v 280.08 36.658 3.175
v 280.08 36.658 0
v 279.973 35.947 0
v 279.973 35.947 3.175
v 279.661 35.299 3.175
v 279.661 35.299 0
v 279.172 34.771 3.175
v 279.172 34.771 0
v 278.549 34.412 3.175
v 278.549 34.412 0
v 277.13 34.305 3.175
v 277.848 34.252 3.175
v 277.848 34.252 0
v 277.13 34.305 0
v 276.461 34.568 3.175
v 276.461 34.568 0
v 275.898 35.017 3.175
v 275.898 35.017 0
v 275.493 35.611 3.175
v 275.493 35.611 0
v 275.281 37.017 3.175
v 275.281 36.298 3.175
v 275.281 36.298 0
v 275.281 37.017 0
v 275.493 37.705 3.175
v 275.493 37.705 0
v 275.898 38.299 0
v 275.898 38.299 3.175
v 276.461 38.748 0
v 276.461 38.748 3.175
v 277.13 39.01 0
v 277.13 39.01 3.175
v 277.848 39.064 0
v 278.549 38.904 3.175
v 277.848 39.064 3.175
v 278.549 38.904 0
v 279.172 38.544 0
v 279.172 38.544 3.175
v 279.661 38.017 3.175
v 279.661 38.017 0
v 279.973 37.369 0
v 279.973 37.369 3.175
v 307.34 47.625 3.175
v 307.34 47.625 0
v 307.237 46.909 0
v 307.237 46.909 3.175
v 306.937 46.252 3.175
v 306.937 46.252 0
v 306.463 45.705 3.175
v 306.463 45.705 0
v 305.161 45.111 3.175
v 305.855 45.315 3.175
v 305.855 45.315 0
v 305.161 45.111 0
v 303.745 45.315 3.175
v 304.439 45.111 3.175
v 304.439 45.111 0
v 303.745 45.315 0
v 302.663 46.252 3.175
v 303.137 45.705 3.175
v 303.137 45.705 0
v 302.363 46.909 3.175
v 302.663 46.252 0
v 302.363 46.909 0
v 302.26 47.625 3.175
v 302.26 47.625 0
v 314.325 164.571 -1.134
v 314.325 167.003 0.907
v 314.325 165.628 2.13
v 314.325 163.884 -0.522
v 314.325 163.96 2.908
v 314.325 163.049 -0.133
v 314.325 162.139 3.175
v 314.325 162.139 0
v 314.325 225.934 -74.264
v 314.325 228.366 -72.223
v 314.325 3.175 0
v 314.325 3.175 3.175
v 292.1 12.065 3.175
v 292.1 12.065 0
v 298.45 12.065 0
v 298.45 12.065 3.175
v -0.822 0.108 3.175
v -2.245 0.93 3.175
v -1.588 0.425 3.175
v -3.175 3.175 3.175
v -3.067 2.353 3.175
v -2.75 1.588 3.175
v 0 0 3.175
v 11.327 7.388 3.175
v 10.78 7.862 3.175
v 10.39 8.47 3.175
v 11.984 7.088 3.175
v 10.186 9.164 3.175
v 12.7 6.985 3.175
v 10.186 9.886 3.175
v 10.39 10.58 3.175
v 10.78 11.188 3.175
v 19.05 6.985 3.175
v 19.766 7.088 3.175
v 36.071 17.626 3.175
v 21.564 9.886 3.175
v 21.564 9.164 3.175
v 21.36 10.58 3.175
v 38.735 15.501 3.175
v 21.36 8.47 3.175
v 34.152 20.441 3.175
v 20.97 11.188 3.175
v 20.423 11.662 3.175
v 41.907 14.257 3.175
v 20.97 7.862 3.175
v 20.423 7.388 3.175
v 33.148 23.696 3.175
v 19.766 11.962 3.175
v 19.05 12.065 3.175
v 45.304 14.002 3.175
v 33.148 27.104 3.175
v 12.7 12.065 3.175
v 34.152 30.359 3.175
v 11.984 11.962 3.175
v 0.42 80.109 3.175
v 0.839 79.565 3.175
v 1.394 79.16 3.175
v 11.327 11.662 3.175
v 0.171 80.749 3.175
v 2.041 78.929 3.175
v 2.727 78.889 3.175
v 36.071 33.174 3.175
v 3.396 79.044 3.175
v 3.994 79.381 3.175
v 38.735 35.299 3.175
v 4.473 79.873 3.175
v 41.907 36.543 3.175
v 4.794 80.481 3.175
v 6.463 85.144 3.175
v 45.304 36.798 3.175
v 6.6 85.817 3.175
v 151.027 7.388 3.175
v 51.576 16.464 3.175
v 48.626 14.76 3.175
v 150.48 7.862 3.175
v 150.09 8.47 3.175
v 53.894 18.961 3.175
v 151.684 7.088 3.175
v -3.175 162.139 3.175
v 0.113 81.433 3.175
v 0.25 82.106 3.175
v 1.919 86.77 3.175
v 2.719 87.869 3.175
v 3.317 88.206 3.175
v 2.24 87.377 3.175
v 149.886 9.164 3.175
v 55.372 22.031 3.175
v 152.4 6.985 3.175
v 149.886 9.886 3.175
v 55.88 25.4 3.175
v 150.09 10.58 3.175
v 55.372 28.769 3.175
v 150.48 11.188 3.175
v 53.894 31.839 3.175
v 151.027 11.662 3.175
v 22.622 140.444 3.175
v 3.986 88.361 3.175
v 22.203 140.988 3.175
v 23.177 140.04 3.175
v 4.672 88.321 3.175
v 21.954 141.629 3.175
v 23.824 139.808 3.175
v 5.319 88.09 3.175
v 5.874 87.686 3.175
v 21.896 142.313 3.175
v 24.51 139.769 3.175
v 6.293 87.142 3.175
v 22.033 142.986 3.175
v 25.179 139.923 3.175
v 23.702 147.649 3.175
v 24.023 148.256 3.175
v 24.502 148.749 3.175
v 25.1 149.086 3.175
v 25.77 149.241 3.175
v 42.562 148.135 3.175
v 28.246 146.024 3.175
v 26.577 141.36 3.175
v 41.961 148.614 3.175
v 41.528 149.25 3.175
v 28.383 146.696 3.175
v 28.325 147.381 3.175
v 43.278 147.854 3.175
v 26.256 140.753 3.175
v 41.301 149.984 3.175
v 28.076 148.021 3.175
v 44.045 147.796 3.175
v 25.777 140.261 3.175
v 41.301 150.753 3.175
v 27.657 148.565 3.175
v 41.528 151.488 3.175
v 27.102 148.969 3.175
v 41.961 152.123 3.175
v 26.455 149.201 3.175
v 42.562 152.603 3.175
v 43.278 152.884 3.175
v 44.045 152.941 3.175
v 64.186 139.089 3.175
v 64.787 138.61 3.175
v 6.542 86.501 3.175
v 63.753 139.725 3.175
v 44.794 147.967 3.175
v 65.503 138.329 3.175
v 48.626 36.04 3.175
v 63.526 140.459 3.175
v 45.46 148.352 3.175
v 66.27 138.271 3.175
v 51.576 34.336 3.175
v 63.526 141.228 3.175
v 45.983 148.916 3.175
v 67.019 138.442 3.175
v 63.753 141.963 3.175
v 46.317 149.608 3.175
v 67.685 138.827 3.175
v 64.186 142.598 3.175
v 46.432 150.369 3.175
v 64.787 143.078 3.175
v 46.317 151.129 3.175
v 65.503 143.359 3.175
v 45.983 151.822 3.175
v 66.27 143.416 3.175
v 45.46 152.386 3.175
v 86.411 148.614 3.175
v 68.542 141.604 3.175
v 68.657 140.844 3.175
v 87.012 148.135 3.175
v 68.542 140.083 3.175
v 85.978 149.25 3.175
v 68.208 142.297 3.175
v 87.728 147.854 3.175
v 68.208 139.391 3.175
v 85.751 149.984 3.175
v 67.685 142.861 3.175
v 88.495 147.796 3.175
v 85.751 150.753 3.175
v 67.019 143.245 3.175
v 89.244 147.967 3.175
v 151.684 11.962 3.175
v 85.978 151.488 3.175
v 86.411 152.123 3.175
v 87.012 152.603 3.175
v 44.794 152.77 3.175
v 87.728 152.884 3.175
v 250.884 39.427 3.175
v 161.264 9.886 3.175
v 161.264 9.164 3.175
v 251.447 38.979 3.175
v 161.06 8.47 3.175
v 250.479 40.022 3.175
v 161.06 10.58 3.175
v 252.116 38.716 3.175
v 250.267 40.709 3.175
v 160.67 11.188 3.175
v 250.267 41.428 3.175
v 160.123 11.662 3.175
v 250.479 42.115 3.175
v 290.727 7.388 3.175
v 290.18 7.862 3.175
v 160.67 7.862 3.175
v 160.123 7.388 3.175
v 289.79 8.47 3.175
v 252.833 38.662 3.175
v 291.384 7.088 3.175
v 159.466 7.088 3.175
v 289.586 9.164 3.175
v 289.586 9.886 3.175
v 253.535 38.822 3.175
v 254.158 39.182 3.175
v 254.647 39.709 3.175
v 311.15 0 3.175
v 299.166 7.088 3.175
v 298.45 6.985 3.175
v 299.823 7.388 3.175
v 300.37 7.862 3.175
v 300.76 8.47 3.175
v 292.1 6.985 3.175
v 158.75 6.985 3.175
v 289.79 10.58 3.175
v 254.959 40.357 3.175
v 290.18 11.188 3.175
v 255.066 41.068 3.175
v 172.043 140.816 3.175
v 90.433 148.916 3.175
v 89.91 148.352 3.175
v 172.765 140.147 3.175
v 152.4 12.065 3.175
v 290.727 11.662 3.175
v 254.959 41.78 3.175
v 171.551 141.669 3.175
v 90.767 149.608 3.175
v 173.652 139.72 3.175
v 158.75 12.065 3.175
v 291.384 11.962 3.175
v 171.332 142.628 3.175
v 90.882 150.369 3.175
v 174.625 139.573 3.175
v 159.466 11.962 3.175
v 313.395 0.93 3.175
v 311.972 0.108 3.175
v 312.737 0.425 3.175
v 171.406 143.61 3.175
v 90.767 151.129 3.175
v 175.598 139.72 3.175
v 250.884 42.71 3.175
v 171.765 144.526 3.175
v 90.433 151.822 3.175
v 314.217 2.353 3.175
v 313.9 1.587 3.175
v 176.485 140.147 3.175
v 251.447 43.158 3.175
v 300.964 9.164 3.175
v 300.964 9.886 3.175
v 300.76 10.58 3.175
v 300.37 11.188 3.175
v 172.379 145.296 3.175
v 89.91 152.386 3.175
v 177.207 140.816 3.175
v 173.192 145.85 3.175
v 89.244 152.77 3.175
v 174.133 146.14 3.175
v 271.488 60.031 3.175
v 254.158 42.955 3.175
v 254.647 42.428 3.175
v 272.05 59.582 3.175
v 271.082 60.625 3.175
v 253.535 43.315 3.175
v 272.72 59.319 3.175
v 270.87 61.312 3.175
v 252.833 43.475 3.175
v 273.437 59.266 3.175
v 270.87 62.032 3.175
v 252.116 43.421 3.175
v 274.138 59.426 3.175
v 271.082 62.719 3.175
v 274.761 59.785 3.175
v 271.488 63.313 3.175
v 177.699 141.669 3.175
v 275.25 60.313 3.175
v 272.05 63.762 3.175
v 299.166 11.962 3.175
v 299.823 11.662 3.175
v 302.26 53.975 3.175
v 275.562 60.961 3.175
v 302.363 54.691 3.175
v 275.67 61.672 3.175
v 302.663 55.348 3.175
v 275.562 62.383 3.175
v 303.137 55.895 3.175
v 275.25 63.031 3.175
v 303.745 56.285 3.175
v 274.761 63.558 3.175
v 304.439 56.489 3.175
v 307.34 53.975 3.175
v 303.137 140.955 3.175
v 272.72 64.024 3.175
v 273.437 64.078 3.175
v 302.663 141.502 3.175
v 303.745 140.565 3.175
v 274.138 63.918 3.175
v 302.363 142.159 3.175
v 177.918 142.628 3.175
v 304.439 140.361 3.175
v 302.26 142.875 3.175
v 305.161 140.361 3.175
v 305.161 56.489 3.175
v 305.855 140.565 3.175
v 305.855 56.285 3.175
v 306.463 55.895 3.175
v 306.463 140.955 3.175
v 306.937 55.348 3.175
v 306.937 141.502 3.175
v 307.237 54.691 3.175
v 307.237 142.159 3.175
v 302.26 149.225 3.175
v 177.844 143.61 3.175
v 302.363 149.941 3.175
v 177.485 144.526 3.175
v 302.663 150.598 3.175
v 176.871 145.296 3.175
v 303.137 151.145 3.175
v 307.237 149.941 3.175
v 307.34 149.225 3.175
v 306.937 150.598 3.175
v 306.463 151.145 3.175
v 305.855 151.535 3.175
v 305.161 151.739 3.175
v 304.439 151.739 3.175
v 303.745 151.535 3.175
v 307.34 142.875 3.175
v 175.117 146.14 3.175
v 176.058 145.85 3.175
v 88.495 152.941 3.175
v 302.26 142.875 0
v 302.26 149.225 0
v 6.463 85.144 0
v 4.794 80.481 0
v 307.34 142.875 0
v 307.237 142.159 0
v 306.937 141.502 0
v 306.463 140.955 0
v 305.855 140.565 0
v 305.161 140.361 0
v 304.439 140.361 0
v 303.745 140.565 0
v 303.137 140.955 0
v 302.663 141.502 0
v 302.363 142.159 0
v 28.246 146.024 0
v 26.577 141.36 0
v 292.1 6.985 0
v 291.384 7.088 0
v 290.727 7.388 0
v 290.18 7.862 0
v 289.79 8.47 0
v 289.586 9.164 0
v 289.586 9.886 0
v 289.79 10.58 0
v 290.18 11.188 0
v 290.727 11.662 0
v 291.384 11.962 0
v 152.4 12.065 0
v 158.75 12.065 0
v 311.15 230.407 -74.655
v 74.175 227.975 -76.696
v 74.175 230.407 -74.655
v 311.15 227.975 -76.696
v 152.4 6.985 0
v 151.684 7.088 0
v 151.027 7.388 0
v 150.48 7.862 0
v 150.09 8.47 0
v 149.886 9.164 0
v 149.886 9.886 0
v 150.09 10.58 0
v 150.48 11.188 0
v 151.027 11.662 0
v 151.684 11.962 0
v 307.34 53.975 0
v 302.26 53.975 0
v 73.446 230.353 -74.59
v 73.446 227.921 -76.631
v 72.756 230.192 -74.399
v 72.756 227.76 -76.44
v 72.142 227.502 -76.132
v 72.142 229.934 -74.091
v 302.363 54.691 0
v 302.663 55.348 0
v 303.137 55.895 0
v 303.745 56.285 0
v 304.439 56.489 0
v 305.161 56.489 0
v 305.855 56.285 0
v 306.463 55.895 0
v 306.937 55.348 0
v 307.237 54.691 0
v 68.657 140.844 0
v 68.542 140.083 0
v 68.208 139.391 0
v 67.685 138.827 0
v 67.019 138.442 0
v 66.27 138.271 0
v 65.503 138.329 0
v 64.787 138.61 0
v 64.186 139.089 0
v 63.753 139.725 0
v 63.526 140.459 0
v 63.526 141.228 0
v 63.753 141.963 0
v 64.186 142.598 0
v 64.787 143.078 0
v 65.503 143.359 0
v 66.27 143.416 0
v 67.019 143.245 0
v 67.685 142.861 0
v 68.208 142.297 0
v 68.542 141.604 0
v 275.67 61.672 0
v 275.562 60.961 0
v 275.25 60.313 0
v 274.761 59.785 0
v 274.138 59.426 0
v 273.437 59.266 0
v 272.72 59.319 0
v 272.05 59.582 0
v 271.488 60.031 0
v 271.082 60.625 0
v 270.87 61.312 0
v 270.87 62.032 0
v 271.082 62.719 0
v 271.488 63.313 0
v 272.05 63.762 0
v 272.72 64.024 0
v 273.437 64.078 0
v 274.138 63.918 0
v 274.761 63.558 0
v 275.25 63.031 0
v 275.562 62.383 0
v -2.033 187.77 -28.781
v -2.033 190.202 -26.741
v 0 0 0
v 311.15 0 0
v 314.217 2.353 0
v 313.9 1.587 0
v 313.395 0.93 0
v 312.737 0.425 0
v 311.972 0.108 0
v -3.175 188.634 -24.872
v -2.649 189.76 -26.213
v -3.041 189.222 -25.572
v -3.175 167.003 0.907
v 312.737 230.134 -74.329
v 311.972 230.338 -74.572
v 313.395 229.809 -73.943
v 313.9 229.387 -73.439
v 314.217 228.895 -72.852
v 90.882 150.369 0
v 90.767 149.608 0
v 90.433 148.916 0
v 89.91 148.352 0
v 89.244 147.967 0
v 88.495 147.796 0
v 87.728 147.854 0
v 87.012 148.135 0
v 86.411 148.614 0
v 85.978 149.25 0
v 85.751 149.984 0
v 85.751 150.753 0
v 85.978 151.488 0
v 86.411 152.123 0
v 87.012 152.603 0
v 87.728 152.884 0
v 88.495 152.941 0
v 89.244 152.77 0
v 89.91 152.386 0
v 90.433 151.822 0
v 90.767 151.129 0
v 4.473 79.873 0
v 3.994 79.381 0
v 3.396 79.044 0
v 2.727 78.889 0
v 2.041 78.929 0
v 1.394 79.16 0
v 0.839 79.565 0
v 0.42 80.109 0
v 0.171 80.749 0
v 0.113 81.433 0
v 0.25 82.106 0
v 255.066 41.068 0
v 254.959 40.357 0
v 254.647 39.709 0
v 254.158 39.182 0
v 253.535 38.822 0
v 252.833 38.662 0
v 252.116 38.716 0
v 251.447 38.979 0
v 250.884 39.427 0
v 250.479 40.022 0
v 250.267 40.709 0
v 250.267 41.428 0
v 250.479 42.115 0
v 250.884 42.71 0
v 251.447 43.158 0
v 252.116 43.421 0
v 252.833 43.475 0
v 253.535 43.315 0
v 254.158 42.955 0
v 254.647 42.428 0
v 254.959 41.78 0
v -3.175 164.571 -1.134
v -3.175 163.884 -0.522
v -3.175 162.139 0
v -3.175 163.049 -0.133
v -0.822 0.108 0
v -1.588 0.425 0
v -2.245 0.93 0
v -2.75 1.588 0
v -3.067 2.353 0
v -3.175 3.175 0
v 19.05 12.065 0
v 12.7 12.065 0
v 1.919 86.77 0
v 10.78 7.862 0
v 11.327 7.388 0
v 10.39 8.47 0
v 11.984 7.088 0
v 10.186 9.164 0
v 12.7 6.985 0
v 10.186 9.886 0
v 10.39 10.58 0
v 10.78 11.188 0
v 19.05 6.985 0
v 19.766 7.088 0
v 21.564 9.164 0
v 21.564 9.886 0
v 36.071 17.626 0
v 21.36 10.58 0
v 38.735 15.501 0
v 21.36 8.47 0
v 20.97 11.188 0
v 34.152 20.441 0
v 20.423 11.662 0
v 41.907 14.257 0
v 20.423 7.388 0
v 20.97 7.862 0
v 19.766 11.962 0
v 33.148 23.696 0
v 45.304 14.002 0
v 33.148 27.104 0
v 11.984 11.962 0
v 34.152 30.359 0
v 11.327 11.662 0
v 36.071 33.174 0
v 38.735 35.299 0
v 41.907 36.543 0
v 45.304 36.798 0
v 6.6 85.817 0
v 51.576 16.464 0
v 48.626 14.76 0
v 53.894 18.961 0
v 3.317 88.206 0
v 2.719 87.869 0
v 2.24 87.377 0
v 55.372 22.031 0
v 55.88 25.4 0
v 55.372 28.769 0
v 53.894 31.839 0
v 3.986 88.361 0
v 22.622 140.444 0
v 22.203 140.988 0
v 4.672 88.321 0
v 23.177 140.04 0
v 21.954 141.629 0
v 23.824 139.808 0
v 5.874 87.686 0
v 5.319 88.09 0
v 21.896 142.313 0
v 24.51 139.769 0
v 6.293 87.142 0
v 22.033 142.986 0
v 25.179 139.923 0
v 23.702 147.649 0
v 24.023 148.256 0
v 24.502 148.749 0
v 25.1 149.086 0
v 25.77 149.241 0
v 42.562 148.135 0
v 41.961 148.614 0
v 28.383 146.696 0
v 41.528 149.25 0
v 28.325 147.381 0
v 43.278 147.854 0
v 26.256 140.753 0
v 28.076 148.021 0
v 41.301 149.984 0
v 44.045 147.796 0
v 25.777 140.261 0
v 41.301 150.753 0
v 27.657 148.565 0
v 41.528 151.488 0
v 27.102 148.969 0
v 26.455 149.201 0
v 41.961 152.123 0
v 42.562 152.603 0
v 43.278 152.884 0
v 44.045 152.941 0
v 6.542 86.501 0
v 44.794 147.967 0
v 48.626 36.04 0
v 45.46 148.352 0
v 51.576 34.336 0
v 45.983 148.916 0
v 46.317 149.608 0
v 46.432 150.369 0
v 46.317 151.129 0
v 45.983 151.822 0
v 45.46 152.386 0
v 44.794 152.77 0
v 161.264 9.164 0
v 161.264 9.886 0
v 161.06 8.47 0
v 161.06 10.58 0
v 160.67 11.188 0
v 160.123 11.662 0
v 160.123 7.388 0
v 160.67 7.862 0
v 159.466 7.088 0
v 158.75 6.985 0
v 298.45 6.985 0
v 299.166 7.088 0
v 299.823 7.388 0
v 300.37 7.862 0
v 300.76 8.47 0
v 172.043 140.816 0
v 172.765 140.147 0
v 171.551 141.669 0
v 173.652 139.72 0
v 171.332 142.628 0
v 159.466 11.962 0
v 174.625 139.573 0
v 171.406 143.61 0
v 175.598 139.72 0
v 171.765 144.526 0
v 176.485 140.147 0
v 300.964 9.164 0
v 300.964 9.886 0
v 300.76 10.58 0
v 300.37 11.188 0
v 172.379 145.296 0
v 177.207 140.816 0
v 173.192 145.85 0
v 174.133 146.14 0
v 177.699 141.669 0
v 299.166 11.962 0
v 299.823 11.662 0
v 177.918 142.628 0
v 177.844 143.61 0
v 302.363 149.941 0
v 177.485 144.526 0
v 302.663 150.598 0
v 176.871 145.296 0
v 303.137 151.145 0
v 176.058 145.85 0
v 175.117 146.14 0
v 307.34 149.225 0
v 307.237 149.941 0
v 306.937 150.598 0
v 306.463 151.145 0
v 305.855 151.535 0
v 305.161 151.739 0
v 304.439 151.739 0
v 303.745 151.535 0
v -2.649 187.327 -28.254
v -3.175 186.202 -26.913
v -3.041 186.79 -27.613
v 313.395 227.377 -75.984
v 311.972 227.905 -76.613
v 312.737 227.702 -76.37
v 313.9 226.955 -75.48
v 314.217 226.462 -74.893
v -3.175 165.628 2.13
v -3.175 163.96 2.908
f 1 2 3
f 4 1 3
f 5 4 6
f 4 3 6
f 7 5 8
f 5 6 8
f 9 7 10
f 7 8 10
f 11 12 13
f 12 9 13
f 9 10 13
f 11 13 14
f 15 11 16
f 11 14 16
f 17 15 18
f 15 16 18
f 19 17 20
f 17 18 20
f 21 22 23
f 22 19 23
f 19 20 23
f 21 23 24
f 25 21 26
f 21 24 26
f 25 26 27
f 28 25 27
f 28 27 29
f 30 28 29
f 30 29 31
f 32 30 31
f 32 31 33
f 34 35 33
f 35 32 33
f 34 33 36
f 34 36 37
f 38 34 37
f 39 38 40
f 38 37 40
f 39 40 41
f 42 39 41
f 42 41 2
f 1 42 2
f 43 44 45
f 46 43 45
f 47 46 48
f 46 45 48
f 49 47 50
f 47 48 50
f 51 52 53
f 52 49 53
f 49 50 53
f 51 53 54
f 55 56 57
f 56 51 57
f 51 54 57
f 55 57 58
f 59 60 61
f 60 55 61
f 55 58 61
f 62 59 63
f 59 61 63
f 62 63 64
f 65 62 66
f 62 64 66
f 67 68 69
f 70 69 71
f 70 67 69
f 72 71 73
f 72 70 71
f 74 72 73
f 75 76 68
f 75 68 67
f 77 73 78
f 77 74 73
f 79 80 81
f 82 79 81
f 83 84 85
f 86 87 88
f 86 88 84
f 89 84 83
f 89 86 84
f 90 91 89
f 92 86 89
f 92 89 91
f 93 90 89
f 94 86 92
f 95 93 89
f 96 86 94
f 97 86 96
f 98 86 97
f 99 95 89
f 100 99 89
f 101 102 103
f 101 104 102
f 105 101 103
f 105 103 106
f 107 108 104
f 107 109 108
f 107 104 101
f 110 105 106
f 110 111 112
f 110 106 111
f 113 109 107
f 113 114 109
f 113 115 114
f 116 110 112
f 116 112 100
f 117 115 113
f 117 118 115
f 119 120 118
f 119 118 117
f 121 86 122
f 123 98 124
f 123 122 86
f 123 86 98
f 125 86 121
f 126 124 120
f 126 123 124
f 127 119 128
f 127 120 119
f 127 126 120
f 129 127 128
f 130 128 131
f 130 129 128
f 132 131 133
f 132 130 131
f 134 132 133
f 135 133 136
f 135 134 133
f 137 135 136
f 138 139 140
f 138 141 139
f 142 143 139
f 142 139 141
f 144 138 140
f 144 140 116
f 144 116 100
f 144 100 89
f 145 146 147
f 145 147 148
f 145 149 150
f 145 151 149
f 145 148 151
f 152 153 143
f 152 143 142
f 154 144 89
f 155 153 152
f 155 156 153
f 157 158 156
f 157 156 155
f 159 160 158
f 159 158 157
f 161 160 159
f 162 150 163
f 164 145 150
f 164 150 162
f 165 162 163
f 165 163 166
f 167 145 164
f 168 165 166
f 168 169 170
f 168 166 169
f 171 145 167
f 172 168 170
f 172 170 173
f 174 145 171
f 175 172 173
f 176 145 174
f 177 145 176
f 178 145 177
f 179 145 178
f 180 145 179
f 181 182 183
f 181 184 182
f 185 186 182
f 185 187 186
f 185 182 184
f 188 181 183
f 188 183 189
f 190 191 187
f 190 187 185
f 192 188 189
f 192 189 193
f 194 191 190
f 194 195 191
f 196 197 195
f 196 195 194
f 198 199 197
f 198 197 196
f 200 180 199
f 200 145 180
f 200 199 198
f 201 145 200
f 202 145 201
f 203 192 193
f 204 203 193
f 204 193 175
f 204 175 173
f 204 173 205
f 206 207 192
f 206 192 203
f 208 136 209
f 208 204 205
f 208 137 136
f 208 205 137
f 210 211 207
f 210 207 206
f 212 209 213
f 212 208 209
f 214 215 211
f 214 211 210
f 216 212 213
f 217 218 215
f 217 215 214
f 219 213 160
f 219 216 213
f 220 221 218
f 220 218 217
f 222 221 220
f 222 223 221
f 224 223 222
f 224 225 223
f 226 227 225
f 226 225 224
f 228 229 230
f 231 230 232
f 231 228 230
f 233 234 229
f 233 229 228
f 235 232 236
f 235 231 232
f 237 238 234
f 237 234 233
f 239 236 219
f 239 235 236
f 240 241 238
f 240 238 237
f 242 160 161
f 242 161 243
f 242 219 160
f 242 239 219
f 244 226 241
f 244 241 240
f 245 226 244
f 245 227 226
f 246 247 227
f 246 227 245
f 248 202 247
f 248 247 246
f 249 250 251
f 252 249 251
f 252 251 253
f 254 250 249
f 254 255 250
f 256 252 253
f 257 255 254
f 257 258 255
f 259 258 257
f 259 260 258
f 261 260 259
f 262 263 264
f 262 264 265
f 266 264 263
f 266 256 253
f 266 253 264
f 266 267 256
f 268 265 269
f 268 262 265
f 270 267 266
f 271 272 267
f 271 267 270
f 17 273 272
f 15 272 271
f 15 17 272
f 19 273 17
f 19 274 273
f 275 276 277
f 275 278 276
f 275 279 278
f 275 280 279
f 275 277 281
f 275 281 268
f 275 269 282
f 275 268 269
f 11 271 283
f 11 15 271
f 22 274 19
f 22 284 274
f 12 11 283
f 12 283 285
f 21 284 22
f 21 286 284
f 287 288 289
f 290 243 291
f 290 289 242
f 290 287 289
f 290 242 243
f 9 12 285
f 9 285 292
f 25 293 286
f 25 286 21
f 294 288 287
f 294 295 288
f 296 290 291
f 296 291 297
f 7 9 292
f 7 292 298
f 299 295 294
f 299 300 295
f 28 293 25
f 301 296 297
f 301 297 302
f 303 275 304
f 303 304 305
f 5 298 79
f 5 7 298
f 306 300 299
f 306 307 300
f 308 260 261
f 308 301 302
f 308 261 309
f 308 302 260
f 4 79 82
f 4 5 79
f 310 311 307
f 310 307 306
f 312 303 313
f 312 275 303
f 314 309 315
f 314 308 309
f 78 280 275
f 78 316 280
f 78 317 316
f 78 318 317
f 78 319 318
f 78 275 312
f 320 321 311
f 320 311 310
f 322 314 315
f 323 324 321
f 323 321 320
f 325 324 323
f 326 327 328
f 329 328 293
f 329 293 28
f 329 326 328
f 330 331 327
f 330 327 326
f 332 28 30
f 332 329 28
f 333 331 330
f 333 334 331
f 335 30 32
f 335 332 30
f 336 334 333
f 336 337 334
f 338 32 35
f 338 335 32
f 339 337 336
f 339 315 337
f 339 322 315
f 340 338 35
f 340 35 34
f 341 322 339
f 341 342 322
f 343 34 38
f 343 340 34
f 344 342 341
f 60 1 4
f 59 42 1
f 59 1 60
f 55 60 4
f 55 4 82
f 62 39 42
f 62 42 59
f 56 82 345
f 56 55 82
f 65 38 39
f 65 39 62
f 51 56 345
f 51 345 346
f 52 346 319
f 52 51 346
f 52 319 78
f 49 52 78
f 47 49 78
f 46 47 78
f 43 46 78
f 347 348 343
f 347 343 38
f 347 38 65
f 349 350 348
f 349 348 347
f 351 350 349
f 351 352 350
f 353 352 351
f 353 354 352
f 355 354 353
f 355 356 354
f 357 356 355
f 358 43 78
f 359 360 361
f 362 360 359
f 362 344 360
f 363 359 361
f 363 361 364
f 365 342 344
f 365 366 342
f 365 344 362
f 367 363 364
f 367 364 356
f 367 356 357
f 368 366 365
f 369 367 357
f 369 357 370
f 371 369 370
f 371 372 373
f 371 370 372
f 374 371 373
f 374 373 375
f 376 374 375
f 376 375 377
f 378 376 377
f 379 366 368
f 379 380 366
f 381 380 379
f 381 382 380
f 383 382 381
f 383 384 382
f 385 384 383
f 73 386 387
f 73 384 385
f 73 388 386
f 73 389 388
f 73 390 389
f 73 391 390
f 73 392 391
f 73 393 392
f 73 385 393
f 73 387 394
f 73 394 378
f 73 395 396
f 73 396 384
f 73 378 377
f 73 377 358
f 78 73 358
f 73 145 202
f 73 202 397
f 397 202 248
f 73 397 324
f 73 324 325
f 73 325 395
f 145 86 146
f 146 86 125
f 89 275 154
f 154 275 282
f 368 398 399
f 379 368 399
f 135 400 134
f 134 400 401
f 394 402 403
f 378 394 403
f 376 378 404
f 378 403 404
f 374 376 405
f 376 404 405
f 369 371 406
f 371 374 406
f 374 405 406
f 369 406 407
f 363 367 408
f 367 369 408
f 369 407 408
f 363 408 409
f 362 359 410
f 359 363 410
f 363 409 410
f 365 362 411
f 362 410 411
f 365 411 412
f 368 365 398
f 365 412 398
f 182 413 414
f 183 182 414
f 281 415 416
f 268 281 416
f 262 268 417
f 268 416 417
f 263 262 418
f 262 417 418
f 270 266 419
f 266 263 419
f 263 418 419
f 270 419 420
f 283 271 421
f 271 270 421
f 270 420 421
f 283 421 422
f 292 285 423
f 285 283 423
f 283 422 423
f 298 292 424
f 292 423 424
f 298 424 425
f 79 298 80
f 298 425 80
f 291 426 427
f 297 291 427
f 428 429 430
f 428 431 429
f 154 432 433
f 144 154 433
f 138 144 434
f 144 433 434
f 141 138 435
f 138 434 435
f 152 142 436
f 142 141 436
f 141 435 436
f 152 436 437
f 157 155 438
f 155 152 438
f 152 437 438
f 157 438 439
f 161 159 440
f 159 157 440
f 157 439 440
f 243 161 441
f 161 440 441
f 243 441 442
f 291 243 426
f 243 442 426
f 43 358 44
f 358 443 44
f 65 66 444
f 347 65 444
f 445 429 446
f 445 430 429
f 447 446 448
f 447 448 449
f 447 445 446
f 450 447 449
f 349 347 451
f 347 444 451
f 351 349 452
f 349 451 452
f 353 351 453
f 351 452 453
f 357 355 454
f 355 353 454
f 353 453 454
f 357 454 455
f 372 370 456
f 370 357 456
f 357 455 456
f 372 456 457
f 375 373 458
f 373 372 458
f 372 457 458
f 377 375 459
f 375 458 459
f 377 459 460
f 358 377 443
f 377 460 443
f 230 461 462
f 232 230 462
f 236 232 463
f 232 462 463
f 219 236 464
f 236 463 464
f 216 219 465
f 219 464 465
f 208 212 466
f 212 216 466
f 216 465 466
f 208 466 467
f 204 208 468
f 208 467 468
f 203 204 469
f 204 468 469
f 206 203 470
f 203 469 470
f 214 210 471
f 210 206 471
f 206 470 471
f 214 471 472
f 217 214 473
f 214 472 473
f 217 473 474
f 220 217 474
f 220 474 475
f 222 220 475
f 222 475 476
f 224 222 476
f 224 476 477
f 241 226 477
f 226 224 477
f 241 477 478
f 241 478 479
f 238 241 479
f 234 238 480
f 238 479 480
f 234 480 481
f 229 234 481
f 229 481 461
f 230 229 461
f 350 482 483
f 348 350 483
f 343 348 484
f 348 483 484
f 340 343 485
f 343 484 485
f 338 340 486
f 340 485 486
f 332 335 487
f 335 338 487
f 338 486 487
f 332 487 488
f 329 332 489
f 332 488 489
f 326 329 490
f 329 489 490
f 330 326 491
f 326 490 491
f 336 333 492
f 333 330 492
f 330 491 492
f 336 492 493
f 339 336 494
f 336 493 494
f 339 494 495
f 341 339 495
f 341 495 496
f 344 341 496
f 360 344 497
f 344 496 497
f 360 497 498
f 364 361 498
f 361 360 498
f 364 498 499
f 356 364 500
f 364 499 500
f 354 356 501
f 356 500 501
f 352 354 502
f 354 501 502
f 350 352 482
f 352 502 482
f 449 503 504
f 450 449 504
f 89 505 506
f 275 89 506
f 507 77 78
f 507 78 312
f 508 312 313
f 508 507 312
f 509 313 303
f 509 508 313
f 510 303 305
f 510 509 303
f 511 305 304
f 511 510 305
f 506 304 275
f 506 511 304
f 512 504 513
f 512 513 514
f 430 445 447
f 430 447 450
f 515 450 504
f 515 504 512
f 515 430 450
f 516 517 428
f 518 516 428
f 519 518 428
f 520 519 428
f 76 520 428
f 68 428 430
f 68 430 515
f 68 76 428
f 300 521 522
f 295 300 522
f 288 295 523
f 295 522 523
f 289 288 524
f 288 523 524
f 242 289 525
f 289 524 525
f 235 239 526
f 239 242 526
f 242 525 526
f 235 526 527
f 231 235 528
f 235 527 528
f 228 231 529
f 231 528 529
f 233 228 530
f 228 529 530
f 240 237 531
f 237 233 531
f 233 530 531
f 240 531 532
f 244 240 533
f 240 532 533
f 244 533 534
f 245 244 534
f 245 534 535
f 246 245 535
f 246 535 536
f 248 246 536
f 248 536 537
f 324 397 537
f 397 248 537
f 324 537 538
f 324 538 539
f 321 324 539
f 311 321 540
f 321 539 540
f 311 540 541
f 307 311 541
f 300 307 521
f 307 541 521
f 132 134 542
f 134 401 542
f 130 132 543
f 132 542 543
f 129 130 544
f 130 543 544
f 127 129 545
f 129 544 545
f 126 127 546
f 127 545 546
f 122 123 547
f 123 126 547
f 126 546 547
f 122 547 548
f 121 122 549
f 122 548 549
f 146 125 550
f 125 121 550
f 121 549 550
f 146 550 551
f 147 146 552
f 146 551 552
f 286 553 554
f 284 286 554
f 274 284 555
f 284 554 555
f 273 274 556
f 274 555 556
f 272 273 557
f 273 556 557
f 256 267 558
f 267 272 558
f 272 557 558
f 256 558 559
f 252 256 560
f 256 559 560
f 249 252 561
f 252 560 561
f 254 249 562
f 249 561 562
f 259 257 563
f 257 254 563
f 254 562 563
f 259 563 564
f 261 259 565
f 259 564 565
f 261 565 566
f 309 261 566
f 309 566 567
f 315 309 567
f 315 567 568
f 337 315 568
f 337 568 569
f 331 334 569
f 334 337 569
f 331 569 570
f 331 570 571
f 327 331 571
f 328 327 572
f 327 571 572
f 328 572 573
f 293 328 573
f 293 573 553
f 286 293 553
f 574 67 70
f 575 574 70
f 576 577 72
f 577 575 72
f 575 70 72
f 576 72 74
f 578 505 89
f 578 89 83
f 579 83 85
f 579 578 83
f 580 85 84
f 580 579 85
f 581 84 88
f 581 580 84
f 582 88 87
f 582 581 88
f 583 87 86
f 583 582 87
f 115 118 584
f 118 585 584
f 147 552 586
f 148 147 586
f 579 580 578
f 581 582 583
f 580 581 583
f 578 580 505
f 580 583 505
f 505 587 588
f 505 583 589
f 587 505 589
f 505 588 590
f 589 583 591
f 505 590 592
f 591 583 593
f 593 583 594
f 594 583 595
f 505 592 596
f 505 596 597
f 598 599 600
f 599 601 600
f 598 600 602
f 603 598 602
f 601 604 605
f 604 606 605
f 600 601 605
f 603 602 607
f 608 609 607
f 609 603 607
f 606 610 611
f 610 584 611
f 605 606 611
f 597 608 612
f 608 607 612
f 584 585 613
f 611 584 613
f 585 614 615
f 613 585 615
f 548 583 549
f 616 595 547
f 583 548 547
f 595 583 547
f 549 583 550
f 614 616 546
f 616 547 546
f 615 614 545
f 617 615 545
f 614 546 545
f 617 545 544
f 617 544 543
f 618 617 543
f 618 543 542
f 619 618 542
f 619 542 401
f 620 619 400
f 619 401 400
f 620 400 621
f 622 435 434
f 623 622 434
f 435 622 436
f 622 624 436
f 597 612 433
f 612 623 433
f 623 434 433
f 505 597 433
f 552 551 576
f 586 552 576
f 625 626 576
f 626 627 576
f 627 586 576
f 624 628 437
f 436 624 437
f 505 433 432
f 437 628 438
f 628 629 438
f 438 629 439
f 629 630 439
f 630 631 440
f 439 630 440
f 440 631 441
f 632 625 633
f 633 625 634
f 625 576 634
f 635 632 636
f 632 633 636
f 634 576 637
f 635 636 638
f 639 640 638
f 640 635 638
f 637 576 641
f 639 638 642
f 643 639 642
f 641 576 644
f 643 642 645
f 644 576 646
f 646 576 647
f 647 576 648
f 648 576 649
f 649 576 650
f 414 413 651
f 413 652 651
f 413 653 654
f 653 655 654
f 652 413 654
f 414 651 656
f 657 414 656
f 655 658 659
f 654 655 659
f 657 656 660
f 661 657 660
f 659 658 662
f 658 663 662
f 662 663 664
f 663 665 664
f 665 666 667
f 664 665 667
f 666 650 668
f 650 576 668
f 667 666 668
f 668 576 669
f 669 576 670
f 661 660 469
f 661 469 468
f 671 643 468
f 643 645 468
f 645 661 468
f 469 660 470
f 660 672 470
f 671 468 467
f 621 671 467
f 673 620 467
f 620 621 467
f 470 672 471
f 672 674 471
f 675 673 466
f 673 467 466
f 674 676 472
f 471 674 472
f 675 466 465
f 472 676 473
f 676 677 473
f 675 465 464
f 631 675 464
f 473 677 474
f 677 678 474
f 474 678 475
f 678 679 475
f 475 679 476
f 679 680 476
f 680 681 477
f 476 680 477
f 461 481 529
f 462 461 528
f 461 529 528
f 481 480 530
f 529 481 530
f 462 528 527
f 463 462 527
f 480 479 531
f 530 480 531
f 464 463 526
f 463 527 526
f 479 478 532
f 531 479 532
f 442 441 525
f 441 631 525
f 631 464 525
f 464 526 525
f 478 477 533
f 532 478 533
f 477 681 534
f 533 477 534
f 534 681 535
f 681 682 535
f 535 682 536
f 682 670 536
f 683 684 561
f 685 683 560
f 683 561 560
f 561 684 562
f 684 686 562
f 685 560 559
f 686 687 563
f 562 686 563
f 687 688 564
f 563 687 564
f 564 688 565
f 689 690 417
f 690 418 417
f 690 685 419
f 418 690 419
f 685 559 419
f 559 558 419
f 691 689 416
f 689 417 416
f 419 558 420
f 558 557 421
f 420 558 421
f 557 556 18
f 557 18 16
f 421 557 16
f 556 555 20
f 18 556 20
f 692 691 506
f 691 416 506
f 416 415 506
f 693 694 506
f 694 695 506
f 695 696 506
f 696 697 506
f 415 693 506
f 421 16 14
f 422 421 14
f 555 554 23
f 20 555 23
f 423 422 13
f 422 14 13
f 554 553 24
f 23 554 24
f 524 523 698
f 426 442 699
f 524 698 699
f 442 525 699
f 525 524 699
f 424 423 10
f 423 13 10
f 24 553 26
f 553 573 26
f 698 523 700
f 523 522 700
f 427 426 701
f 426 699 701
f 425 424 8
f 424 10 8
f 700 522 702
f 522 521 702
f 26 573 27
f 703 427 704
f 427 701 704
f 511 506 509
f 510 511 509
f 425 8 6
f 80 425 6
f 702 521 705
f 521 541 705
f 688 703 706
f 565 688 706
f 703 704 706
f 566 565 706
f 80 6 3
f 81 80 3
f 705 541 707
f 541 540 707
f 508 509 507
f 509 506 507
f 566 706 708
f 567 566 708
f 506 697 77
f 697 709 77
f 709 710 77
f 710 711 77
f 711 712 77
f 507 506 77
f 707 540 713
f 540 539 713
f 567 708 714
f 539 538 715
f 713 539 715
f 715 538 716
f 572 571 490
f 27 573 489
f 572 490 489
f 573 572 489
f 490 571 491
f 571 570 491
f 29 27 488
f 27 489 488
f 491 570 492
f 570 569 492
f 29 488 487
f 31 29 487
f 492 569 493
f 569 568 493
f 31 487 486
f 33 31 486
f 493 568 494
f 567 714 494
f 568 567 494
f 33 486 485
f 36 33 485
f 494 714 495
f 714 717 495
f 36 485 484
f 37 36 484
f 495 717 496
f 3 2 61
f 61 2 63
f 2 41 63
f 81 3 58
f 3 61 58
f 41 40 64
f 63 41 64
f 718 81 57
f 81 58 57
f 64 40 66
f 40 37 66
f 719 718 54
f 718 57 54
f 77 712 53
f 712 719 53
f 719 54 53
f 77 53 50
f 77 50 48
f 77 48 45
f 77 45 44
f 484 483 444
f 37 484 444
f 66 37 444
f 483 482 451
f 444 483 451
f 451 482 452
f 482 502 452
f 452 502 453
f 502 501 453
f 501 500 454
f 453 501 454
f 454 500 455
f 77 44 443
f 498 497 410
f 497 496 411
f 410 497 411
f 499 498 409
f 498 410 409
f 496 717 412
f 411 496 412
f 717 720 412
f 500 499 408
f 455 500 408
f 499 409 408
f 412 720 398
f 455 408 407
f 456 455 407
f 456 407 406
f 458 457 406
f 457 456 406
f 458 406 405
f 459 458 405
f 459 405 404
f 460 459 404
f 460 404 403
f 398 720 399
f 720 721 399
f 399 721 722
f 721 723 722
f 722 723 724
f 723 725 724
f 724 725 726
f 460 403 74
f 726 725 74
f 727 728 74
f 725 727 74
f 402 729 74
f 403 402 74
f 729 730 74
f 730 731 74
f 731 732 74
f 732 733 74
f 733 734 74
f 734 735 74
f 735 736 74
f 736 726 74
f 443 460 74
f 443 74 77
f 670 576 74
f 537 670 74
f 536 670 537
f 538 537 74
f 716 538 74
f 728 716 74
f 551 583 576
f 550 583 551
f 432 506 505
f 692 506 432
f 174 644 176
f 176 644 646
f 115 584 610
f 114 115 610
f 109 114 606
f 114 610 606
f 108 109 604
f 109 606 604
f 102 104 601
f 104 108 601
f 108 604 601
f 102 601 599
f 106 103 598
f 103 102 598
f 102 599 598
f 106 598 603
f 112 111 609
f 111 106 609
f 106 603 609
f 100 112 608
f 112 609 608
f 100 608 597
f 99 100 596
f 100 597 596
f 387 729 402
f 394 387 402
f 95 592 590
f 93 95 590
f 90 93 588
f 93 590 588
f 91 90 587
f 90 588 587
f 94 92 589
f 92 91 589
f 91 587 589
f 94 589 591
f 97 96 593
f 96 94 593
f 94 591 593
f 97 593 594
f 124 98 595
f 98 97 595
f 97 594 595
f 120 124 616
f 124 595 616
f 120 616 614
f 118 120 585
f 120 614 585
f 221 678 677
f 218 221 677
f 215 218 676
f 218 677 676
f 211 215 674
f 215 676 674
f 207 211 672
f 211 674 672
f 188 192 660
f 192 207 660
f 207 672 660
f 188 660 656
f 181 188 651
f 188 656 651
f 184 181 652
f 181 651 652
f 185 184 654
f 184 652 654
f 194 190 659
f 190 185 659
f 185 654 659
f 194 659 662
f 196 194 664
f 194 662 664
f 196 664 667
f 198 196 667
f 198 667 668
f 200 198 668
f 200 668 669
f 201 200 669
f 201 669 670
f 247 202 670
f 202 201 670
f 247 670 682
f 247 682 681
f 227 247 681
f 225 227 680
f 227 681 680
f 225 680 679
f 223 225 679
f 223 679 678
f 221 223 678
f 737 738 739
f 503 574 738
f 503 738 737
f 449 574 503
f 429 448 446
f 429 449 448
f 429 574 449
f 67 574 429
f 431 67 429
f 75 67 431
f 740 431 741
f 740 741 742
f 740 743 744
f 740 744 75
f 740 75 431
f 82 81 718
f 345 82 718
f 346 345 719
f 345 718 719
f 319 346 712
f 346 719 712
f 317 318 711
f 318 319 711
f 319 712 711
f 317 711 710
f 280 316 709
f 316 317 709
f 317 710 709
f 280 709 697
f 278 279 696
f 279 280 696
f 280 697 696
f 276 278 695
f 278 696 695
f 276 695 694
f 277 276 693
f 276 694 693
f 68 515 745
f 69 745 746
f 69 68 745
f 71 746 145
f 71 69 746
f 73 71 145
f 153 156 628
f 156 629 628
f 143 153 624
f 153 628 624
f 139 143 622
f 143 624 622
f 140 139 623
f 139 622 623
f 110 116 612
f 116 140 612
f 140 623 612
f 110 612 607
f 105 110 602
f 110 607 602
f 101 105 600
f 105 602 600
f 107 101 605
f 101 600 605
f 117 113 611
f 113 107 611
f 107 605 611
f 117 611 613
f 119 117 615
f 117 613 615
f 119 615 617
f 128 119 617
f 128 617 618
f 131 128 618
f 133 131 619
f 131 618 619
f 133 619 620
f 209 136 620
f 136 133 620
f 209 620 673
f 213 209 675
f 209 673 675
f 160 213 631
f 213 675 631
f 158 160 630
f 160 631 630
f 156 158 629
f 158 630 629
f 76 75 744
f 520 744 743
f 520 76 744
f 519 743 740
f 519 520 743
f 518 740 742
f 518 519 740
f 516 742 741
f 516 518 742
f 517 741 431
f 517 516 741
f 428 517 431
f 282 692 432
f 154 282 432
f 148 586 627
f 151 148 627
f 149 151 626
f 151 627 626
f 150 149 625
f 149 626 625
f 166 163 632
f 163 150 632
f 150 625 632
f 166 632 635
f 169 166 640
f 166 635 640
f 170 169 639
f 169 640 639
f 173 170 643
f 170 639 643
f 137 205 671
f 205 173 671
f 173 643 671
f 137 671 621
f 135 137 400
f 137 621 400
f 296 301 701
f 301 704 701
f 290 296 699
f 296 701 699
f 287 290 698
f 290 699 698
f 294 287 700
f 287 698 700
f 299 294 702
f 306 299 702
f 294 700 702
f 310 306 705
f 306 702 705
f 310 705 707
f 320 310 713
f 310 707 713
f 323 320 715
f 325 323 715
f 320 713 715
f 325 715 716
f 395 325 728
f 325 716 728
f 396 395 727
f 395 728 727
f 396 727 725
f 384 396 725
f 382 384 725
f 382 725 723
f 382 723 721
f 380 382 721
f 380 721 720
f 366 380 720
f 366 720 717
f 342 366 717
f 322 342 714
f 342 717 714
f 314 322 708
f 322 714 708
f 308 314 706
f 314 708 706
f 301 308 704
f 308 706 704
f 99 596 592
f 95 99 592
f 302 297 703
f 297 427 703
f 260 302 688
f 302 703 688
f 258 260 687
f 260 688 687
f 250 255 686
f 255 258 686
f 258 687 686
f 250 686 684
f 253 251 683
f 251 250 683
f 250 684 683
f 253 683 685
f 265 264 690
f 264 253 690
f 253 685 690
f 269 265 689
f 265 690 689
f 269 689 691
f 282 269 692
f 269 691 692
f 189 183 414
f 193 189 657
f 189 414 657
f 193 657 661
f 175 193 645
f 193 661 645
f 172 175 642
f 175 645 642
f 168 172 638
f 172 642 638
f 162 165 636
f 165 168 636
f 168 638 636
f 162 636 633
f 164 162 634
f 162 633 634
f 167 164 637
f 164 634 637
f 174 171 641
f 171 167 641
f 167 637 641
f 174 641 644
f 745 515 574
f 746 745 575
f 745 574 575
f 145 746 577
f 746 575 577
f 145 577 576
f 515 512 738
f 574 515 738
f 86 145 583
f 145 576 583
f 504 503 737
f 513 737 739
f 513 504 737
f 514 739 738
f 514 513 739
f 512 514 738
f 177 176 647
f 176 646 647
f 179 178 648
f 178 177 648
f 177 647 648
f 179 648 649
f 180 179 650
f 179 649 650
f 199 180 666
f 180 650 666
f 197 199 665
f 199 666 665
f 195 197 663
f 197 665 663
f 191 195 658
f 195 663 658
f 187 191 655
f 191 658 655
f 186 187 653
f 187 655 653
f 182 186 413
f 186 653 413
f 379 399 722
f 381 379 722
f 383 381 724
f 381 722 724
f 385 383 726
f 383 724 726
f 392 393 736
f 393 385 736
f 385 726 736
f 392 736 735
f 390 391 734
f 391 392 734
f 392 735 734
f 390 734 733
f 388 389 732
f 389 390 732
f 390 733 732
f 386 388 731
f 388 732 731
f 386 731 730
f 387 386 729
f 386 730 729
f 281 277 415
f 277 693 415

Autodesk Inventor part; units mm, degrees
ref_plane "YZ Plane" through (0, 0, 0) normal (1, 0, 0) x (0, 1, 0)
ref_plane "XZ Plane" through (0, 0, 0) normal (0, 1, 0) x (-1, 0, 0)
ref_plane "XY Plane" through (0, 0, 0) normal (0, 0, 1) x (1, 0, 0)
sketch "Sketch1" plane through (0, 0, 0) normal (0, 0, 1) x (1, 0, 0)
  arc A0 (-3.175, 3.175) -> (0, 0) centre (0, 3.175) ccw
  line L0 (0, 0) -> (311.15, 0)
  arc A1 (311.15, 0) -> (314.325, 3.175) centre (311.15, 3.175) ccw
  line L1 (314.325, 3.175) -> (314.325, 161.925)
  line L2 (311.15, 165.1) -> (12.1553, 165.1)
  line L3 (-3.175, 149.7697) -> (-3.175, 3.175)
  line L4 (292.1, 12.065) -> (298.45, 12.065)
  arc A2 (298.45, 6.985) -> (298.45, 12.065) centre (298.45, 9.525) ccw
  line L5 (298.45, 6.985) -> (292.1, 6.985)
  arc A3 (292.1, 12.065) -> (292.1, 6.985) centre (292.1, 9.525) ccw
  line L6 (302.26, 47.625) -> (302.26, 53.975)
  arc A4 (307.34, 53.975) -> (302.26, 53.975) centre (304.8, 53.975) ccw
  line L7 (307.34, 53.975) -> (307.34, 47.625)
  arc A5 (302.26, 47.625) -> (307.34, 47.625) centre (304.8, 47.625) ccw
  line L8 (152.4, 12.065) -> (158.75, 12.065)
  arc A6 (158.75, 6.985) -> (158.75, 12.065) centre (158.75, 9.525) ccw
  line L9 (158.75, 6.985) -> (152.4, 6.985)
  arc A7 (152.4, 12.065) -> (152.4, 6.985) centre (152.4, 9.525) ccw
  line L10 (12.7, 12.065) -> (19.05, 12.065)
  arc A8 (19.05, 6.985) -> (19.05, 12.065) centre (19.05, 9.525) ccw
  line L11 (19.05, 6.985) -> (12.7, 6.985)
  arc A9 (12.7, 12.065) -> (12.7, 6.985) centre (12.7, 9.525) ccw
  line L12 (302.26, 142.875) -> (302.26, 149.225)
  arc A10 (307.34, 149.225) -> (302.26, 149.225) centre (304.8, 149.225) ccw
  line L13 (307.34, 149.225) -> (307.34, 142.875)
  arc A11 (302.26, 142.875) -> (307.34, 142.875) centre (304.8, 142.875) ccw
  line L14 (0.2503, 82.1064) -> (1.9189, 86.7699)
  arc A12 (6.4628, 85.1441) -> (1.9189, 86.7699) centre (4.1909, 85.957) ccw
  line L15 (6.4628, 85.1441) -> (4.7942, 80.4806)
  arc A13 (0.2503, 82.1064) -> (4.7942, 80.4806) centre (2.5223, 81.2935) ccw
  line L16 (28.2458, 146.0235) -> (26.5772, 141.36)
  arc A14 (22.0333, 142.9859) -> (26.5772, 141.36) centre (24.3053, 142.1729) ccw
  line L17 (22.0333, 142.9859) -> (23.702, 147.6493)
  arc A15 (28.2458, 146.0235) -> (23.702, 147.6493) centre (25.9739, 146.8364) ccw
  circle A16 centre (88.302, 150.3688) radius 2.5797
  circle A17 centre (66.077, 140.8438) radius 2.5797
  circle A18 centre (43.852, 150.3688) radius 2.5797
  circle A19 centre (273.2565, 61.6719) radius 2.413
  circle A20 centre (252.6531, 41.0685) radius 2.413
  circle A21 centre (277.6672, 36.6578) radius 2.413
  circle A22 centre (44.45, 25.4) radius 11.43
  line L18 (12.1553, 165.1) -> (-3.175, 165.1)
  line L19 (-3.175, 165.1) -> (-3.175, 149.7697)
  line L20 (314.325, 161.925) -> (314.325, 165.1)
  line L21 (314.325, 165.1) -> (311.15, 165.1)
  point P0 (0, 0)
  point P1 (-3.175, 3.175)
  point P2 (0, 0)
  point P3 (314.325, 3.175)
  point P4 (22.0333, 142.9859)
  point P5 (23.702, 147.6493)
  point P6 (28.2458, 146.0235)
  point P7 (26.5772, 141.36)
  point P8 (6.4628, 85.1441)
  point P9 (19.05, 6.985)
  point P10 (158.75, 6.985)
  point P11 (298.45, 6.985)
  dimension "GapSize" = 3.175
extrude "Plate1" add sketch "Sketch1" along normal blind 3.175
sketch "Sketch2" plane through (314.325, 162.6678, 1.1341) normal (0, 0.7660444, 0.6427876) x (-1, 0, 0)
  line L0 (317.5, 0) -> (0, 0)
  line L1 (0, 0) -> (0, -101.6)
  line L2 (0, -101.6) -> (317.5, -101.6)
  line L3 (317.5, -101.6) -> (317.5, 0)
edge flange "Flange1" height 101.6 angle 50 thickness 3.175 bend radius 3.175 thickness toward (0, 0.7660444, 0.6427876) relief tear relief width 3.175 relief depth 1.5875 edges at (161.6526, 165.1, 0) wall of the first edge with corners at (-3.175, 162.6678, 1.1341) (314.325, 162.6678, 1.1341) (314.325, 227.975, -76.696) (-3.175, 227.975, -76.696)
bend "Bend1"
corner "Corner1"
chamfer "Corner Chamfer1" distance 76.2 distance2 63.5 1 edges at (-3.175, 229.1911, -75.6755) measured on face at (102.6583, 228.7858, -76.0157)
sketch "Sketch3" plane through (0, 0, 3.175) normal (0, 0, 1) x (1, 0, 0)
  line L0 (311.15, 0) -> (0, 0) projected
  line L1 (-3.175, 3.175) -> (-3.175, 162.1389) projected
  point P0 (174.625, 142.875)
  dimension "d149" = 142.875
  dimension "d150" = 177.8
hole "Hole1" at (174.625, 142.875, 3.175) direction (0, 0, -1) diameter 6.604 end through all
fillet "Corner Round1" radius 3.175 3 edges at (314.325, 229.1911, -75.6755) (73.025, 229.1911, -75.6755) (-3.175, 188.3741, -27.0317)
equation "\"GapSize\" = Thickness"
equation "\"d156\" = Thickness"
equation "\"d135\" = Thickness"
equation "\"d136\" = BendReliefWidth"
equation "\"d137\" = BendReliefDepth"
equation "\"d138\" = MinimumRemnant"
equation "\"d139\" = TransitionRadius"
equation "\"d142\" = BendRadius"
equation "\"d143\" = CornerReliefSize"
equation "\"d144\" = GapSize"
equation "\"d145\" = JacobiRadiusSize"
equation "\"BendRadius\" = Thickness"
equation "\"BendReliefWidth\" = Thickness"
equation "\"BendReliefDepth\" = 0.5 * Thickness"
equation "\"CornerReliefSize\" = 4 * Thickness"
equation "\"MinimumRemnant\" = 2 * Thickness"
equation "\"TransitionRadius\" = BendRadius"
equation "\"JacobiRadiusSize\" = BendRadius"
equation "\"Thickness\" = 3.175"
properties part number "TURRET,WIRE,PLATE,BOTTOM" material "Polycarbonate, Clear"
